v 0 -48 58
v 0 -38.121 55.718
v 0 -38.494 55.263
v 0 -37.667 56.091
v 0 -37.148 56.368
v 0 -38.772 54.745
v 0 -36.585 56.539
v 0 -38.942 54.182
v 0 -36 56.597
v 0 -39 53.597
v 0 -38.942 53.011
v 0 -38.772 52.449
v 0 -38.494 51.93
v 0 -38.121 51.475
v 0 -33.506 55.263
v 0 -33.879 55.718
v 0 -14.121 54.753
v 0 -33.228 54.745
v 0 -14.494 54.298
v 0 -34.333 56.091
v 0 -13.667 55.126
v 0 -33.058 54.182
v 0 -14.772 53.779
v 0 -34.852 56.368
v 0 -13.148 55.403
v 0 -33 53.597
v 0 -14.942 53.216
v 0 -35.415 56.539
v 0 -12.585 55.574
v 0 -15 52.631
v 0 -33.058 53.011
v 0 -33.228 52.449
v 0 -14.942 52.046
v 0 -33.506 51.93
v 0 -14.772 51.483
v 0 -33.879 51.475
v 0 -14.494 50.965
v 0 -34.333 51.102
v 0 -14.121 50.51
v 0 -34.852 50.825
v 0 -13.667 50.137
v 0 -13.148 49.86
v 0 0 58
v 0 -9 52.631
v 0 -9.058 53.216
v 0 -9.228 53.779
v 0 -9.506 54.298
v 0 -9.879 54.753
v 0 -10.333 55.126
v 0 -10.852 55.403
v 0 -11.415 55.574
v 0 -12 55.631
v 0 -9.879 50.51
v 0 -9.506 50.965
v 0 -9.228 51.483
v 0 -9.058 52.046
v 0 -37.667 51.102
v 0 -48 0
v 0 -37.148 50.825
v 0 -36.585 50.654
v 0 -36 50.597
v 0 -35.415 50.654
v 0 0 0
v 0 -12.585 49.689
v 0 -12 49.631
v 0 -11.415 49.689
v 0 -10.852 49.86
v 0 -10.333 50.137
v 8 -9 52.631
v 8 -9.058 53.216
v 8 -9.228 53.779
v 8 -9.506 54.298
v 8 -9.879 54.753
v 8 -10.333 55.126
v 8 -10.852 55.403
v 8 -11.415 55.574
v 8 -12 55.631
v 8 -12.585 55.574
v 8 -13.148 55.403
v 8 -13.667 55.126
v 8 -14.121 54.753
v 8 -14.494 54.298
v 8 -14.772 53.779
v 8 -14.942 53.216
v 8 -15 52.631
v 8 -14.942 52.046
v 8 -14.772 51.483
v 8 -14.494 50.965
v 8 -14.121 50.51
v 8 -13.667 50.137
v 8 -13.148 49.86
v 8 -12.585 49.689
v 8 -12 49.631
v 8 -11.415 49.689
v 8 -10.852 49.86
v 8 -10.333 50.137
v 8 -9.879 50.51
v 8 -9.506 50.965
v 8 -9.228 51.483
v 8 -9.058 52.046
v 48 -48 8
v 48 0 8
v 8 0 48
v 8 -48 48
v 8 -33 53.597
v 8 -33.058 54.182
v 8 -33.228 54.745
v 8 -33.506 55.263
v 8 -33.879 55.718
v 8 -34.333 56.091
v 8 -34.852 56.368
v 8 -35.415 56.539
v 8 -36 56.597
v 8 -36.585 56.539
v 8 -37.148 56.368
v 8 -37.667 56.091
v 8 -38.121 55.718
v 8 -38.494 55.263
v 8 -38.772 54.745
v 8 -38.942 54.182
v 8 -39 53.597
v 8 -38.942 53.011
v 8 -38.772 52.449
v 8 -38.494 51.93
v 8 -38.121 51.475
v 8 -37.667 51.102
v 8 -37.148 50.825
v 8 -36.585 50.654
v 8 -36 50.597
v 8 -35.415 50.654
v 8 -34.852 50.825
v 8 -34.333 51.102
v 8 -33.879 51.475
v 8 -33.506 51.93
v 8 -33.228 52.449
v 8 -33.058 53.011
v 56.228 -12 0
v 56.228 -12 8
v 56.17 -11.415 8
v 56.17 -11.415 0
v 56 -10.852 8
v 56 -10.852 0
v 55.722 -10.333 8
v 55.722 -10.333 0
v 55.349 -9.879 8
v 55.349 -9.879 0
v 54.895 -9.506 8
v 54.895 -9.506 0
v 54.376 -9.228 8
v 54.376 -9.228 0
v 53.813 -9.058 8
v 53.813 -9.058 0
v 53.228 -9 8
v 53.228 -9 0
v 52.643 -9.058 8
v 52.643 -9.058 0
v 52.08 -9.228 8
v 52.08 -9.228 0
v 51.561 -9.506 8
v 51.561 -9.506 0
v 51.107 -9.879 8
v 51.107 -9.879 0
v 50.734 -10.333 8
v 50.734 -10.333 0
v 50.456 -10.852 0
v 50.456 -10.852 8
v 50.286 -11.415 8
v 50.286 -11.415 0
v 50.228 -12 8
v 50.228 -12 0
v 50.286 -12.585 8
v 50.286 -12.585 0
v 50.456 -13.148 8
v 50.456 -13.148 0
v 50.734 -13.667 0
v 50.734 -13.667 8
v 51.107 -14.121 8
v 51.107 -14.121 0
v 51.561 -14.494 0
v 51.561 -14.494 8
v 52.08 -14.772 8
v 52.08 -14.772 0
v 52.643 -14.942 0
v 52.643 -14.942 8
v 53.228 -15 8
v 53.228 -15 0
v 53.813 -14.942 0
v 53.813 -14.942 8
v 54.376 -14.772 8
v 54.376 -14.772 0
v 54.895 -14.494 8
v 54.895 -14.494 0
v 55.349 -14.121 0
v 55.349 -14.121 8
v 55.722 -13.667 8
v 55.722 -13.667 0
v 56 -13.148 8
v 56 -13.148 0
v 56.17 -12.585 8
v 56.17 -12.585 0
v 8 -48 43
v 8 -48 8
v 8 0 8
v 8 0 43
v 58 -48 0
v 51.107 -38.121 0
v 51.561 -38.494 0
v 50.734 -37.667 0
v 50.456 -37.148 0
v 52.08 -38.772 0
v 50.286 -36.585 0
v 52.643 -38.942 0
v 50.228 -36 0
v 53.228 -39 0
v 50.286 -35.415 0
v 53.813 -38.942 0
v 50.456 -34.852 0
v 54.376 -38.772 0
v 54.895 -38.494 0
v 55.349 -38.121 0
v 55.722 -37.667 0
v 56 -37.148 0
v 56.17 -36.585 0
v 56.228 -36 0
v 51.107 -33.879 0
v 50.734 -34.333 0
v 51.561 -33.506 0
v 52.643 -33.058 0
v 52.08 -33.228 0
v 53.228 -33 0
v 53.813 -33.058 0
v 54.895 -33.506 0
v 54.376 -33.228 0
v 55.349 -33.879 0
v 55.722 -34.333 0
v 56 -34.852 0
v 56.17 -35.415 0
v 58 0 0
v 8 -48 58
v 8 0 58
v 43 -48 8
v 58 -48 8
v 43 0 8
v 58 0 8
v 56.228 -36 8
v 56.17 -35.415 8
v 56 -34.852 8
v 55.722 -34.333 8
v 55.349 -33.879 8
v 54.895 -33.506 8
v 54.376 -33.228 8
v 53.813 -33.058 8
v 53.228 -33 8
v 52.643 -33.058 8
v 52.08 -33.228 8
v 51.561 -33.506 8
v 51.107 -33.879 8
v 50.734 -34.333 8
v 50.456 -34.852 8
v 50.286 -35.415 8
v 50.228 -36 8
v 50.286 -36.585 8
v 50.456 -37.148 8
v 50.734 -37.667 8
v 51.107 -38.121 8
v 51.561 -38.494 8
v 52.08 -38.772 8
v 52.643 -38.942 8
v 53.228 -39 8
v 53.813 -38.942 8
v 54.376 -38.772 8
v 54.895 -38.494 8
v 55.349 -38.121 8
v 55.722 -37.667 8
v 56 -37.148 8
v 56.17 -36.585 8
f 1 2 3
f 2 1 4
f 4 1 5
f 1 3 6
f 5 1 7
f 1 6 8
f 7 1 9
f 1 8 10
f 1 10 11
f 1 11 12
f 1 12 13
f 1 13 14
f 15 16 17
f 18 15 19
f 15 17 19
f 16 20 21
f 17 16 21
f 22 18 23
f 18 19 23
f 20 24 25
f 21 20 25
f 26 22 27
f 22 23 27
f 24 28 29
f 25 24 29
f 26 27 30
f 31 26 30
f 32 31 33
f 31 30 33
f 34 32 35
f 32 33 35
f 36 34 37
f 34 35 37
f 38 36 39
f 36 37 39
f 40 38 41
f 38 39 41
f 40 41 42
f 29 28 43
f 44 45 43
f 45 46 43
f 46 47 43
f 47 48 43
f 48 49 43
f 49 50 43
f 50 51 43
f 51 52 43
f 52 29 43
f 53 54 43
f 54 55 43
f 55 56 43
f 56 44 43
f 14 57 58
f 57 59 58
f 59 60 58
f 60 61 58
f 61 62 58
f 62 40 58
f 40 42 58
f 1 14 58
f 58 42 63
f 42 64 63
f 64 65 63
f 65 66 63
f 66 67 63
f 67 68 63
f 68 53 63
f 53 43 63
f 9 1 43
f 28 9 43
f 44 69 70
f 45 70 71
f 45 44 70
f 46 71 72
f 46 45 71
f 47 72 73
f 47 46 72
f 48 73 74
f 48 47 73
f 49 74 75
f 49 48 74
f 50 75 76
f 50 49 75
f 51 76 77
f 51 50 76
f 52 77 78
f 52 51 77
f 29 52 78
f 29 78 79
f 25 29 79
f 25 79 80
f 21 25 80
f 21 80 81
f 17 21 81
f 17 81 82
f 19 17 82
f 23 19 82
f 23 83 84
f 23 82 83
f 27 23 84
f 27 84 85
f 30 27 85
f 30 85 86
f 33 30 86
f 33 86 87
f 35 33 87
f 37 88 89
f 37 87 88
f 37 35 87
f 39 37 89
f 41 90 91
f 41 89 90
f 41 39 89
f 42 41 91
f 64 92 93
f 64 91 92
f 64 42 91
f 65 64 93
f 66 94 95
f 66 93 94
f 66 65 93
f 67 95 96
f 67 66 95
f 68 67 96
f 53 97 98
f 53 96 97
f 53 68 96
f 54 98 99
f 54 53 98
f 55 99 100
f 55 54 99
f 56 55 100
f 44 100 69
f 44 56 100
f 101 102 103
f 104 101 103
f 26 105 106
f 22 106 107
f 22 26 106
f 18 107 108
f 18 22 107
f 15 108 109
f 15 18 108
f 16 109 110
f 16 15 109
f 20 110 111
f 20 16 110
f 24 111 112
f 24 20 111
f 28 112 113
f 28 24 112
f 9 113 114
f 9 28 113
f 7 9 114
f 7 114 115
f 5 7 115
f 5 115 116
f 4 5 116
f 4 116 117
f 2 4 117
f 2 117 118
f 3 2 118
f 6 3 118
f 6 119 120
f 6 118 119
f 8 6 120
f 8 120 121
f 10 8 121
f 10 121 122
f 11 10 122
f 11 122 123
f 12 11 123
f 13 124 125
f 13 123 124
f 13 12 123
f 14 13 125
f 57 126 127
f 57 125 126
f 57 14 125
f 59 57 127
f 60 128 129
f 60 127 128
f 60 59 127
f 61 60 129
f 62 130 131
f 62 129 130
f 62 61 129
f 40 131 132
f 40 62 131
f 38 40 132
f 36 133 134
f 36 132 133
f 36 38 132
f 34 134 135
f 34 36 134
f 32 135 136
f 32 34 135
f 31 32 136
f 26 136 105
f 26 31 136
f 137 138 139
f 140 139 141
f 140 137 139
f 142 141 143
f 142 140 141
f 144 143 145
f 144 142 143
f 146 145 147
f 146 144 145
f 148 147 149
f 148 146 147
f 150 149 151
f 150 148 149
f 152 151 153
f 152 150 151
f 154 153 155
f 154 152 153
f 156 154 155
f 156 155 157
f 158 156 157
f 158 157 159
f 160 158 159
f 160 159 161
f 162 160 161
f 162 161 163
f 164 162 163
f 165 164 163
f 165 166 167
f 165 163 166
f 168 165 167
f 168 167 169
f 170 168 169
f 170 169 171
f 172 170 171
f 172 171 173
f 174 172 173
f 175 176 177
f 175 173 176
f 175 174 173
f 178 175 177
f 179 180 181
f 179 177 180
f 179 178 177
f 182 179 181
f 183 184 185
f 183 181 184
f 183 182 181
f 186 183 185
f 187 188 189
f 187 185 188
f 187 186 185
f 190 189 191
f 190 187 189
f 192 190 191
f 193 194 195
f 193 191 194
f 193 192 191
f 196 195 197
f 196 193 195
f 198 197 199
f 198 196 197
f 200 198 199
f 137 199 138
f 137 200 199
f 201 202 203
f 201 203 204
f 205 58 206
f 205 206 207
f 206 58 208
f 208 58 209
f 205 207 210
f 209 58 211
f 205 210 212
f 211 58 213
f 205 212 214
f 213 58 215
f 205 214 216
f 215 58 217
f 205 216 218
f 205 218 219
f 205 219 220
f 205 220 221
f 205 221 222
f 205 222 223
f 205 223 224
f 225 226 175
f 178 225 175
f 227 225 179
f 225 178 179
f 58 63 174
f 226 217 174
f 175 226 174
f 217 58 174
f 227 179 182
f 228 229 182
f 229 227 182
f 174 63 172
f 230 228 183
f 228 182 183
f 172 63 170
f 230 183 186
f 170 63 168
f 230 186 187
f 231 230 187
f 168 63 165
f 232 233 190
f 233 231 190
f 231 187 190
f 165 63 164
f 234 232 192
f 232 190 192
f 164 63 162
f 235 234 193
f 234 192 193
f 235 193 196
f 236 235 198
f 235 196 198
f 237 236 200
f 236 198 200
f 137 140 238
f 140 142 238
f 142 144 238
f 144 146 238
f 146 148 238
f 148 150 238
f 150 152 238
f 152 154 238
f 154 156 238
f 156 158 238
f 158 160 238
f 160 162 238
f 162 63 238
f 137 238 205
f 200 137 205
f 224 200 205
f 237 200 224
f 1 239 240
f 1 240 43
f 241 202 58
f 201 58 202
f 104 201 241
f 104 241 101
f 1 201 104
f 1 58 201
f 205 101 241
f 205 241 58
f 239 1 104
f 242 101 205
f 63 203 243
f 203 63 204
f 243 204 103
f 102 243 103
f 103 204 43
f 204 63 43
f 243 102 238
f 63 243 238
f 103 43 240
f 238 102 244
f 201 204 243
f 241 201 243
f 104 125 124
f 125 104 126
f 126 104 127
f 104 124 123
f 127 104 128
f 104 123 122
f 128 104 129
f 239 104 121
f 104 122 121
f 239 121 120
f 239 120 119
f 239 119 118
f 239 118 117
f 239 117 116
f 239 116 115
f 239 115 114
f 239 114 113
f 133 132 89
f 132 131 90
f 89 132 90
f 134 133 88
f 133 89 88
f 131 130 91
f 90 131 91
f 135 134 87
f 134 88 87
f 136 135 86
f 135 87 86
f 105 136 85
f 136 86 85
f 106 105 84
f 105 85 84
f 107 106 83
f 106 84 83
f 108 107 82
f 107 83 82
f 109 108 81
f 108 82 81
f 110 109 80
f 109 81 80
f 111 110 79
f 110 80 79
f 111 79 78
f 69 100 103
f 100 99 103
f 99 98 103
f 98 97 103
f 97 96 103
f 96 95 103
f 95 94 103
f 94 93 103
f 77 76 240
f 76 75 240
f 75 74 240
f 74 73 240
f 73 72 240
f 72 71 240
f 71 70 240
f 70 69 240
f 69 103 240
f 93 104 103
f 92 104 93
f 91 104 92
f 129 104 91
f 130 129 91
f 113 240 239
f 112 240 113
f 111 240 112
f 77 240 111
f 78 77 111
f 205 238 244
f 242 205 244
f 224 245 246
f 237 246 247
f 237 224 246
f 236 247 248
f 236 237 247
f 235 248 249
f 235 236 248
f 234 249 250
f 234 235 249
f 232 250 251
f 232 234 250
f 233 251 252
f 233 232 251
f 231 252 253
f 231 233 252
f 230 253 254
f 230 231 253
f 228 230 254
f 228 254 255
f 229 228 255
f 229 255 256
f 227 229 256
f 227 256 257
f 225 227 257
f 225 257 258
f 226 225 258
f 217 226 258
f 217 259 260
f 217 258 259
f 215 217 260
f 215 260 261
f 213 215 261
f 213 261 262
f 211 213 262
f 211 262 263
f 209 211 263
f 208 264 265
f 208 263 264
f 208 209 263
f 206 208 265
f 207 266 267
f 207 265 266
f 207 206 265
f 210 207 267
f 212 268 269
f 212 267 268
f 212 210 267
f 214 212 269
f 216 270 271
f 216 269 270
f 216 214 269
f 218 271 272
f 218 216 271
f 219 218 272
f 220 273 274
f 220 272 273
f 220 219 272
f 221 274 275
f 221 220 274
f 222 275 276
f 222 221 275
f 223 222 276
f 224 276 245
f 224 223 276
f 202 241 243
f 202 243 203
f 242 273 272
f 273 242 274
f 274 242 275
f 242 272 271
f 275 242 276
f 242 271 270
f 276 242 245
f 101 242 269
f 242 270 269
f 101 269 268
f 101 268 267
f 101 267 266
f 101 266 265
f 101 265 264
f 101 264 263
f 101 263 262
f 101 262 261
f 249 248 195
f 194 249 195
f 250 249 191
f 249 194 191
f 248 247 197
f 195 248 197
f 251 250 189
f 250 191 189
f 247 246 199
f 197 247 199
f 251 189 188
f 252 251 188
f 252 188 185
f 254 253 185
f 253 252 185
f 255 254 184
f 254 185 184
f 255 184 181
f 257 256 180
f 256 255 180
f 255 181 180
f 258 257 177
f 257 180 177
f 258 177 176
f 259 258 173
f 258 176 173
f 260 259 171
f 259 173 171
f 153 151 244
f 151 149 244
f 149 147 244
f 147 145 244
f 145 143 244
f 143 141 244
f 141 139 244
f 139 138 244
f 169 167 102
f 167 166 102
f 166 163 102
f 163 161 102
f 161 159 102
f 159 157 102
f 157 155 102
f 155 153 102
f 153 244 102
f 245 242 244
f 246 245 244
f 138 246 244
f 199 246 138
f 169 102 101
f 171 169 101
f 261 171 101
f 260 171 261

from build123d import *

# Parameters (mm, degrees)
F1_DEPTH = 48
F2_R     = 3
F3_DEPTH = 25
F4_R     = 3
F5_DEPTH = 25


with BuildPart() as f1:
    # F0 (on Front) → F1 (new body)
    with BuildSketch(Plane.XZ):
        Polygon((0, 8), (0, 0), (58, 0), (58, 8), (48, 8), (43, 8), (8, 8), align=None)
        Polygon((43, 8), (48, 8), (8, 48), (8, 43), align=None)
        Polygon((0, 58), (0, 8), (8, 8), (8, 43), (8, 48), (8, 58), align=None)
    extrude(amount=F1_DEPTH)

    # F2 (on Right) → F3 (cut)
    with BuildSketch(Plane.YZ):
        with Locations((-36, 53.59669)):
            Circle(F2_R)
        with Locations((-12, 52.631229)):
            Circle(F2_R)
    extrude(amount=F3_DEPTH, mode=Mode.SUBTRACT)

    # F4 (on Top) → F5 (cut)
    with BuildSketch(Plane.XY):
        with Locations((53.227946, -36)):
            Circle(F4_R)
        with Locations((53.227946, -12)):
            Circle(F4_R)
    extrude(amount=F5_DEPTH, mode=Mode.SUBTRACT)


solid = f1.part
